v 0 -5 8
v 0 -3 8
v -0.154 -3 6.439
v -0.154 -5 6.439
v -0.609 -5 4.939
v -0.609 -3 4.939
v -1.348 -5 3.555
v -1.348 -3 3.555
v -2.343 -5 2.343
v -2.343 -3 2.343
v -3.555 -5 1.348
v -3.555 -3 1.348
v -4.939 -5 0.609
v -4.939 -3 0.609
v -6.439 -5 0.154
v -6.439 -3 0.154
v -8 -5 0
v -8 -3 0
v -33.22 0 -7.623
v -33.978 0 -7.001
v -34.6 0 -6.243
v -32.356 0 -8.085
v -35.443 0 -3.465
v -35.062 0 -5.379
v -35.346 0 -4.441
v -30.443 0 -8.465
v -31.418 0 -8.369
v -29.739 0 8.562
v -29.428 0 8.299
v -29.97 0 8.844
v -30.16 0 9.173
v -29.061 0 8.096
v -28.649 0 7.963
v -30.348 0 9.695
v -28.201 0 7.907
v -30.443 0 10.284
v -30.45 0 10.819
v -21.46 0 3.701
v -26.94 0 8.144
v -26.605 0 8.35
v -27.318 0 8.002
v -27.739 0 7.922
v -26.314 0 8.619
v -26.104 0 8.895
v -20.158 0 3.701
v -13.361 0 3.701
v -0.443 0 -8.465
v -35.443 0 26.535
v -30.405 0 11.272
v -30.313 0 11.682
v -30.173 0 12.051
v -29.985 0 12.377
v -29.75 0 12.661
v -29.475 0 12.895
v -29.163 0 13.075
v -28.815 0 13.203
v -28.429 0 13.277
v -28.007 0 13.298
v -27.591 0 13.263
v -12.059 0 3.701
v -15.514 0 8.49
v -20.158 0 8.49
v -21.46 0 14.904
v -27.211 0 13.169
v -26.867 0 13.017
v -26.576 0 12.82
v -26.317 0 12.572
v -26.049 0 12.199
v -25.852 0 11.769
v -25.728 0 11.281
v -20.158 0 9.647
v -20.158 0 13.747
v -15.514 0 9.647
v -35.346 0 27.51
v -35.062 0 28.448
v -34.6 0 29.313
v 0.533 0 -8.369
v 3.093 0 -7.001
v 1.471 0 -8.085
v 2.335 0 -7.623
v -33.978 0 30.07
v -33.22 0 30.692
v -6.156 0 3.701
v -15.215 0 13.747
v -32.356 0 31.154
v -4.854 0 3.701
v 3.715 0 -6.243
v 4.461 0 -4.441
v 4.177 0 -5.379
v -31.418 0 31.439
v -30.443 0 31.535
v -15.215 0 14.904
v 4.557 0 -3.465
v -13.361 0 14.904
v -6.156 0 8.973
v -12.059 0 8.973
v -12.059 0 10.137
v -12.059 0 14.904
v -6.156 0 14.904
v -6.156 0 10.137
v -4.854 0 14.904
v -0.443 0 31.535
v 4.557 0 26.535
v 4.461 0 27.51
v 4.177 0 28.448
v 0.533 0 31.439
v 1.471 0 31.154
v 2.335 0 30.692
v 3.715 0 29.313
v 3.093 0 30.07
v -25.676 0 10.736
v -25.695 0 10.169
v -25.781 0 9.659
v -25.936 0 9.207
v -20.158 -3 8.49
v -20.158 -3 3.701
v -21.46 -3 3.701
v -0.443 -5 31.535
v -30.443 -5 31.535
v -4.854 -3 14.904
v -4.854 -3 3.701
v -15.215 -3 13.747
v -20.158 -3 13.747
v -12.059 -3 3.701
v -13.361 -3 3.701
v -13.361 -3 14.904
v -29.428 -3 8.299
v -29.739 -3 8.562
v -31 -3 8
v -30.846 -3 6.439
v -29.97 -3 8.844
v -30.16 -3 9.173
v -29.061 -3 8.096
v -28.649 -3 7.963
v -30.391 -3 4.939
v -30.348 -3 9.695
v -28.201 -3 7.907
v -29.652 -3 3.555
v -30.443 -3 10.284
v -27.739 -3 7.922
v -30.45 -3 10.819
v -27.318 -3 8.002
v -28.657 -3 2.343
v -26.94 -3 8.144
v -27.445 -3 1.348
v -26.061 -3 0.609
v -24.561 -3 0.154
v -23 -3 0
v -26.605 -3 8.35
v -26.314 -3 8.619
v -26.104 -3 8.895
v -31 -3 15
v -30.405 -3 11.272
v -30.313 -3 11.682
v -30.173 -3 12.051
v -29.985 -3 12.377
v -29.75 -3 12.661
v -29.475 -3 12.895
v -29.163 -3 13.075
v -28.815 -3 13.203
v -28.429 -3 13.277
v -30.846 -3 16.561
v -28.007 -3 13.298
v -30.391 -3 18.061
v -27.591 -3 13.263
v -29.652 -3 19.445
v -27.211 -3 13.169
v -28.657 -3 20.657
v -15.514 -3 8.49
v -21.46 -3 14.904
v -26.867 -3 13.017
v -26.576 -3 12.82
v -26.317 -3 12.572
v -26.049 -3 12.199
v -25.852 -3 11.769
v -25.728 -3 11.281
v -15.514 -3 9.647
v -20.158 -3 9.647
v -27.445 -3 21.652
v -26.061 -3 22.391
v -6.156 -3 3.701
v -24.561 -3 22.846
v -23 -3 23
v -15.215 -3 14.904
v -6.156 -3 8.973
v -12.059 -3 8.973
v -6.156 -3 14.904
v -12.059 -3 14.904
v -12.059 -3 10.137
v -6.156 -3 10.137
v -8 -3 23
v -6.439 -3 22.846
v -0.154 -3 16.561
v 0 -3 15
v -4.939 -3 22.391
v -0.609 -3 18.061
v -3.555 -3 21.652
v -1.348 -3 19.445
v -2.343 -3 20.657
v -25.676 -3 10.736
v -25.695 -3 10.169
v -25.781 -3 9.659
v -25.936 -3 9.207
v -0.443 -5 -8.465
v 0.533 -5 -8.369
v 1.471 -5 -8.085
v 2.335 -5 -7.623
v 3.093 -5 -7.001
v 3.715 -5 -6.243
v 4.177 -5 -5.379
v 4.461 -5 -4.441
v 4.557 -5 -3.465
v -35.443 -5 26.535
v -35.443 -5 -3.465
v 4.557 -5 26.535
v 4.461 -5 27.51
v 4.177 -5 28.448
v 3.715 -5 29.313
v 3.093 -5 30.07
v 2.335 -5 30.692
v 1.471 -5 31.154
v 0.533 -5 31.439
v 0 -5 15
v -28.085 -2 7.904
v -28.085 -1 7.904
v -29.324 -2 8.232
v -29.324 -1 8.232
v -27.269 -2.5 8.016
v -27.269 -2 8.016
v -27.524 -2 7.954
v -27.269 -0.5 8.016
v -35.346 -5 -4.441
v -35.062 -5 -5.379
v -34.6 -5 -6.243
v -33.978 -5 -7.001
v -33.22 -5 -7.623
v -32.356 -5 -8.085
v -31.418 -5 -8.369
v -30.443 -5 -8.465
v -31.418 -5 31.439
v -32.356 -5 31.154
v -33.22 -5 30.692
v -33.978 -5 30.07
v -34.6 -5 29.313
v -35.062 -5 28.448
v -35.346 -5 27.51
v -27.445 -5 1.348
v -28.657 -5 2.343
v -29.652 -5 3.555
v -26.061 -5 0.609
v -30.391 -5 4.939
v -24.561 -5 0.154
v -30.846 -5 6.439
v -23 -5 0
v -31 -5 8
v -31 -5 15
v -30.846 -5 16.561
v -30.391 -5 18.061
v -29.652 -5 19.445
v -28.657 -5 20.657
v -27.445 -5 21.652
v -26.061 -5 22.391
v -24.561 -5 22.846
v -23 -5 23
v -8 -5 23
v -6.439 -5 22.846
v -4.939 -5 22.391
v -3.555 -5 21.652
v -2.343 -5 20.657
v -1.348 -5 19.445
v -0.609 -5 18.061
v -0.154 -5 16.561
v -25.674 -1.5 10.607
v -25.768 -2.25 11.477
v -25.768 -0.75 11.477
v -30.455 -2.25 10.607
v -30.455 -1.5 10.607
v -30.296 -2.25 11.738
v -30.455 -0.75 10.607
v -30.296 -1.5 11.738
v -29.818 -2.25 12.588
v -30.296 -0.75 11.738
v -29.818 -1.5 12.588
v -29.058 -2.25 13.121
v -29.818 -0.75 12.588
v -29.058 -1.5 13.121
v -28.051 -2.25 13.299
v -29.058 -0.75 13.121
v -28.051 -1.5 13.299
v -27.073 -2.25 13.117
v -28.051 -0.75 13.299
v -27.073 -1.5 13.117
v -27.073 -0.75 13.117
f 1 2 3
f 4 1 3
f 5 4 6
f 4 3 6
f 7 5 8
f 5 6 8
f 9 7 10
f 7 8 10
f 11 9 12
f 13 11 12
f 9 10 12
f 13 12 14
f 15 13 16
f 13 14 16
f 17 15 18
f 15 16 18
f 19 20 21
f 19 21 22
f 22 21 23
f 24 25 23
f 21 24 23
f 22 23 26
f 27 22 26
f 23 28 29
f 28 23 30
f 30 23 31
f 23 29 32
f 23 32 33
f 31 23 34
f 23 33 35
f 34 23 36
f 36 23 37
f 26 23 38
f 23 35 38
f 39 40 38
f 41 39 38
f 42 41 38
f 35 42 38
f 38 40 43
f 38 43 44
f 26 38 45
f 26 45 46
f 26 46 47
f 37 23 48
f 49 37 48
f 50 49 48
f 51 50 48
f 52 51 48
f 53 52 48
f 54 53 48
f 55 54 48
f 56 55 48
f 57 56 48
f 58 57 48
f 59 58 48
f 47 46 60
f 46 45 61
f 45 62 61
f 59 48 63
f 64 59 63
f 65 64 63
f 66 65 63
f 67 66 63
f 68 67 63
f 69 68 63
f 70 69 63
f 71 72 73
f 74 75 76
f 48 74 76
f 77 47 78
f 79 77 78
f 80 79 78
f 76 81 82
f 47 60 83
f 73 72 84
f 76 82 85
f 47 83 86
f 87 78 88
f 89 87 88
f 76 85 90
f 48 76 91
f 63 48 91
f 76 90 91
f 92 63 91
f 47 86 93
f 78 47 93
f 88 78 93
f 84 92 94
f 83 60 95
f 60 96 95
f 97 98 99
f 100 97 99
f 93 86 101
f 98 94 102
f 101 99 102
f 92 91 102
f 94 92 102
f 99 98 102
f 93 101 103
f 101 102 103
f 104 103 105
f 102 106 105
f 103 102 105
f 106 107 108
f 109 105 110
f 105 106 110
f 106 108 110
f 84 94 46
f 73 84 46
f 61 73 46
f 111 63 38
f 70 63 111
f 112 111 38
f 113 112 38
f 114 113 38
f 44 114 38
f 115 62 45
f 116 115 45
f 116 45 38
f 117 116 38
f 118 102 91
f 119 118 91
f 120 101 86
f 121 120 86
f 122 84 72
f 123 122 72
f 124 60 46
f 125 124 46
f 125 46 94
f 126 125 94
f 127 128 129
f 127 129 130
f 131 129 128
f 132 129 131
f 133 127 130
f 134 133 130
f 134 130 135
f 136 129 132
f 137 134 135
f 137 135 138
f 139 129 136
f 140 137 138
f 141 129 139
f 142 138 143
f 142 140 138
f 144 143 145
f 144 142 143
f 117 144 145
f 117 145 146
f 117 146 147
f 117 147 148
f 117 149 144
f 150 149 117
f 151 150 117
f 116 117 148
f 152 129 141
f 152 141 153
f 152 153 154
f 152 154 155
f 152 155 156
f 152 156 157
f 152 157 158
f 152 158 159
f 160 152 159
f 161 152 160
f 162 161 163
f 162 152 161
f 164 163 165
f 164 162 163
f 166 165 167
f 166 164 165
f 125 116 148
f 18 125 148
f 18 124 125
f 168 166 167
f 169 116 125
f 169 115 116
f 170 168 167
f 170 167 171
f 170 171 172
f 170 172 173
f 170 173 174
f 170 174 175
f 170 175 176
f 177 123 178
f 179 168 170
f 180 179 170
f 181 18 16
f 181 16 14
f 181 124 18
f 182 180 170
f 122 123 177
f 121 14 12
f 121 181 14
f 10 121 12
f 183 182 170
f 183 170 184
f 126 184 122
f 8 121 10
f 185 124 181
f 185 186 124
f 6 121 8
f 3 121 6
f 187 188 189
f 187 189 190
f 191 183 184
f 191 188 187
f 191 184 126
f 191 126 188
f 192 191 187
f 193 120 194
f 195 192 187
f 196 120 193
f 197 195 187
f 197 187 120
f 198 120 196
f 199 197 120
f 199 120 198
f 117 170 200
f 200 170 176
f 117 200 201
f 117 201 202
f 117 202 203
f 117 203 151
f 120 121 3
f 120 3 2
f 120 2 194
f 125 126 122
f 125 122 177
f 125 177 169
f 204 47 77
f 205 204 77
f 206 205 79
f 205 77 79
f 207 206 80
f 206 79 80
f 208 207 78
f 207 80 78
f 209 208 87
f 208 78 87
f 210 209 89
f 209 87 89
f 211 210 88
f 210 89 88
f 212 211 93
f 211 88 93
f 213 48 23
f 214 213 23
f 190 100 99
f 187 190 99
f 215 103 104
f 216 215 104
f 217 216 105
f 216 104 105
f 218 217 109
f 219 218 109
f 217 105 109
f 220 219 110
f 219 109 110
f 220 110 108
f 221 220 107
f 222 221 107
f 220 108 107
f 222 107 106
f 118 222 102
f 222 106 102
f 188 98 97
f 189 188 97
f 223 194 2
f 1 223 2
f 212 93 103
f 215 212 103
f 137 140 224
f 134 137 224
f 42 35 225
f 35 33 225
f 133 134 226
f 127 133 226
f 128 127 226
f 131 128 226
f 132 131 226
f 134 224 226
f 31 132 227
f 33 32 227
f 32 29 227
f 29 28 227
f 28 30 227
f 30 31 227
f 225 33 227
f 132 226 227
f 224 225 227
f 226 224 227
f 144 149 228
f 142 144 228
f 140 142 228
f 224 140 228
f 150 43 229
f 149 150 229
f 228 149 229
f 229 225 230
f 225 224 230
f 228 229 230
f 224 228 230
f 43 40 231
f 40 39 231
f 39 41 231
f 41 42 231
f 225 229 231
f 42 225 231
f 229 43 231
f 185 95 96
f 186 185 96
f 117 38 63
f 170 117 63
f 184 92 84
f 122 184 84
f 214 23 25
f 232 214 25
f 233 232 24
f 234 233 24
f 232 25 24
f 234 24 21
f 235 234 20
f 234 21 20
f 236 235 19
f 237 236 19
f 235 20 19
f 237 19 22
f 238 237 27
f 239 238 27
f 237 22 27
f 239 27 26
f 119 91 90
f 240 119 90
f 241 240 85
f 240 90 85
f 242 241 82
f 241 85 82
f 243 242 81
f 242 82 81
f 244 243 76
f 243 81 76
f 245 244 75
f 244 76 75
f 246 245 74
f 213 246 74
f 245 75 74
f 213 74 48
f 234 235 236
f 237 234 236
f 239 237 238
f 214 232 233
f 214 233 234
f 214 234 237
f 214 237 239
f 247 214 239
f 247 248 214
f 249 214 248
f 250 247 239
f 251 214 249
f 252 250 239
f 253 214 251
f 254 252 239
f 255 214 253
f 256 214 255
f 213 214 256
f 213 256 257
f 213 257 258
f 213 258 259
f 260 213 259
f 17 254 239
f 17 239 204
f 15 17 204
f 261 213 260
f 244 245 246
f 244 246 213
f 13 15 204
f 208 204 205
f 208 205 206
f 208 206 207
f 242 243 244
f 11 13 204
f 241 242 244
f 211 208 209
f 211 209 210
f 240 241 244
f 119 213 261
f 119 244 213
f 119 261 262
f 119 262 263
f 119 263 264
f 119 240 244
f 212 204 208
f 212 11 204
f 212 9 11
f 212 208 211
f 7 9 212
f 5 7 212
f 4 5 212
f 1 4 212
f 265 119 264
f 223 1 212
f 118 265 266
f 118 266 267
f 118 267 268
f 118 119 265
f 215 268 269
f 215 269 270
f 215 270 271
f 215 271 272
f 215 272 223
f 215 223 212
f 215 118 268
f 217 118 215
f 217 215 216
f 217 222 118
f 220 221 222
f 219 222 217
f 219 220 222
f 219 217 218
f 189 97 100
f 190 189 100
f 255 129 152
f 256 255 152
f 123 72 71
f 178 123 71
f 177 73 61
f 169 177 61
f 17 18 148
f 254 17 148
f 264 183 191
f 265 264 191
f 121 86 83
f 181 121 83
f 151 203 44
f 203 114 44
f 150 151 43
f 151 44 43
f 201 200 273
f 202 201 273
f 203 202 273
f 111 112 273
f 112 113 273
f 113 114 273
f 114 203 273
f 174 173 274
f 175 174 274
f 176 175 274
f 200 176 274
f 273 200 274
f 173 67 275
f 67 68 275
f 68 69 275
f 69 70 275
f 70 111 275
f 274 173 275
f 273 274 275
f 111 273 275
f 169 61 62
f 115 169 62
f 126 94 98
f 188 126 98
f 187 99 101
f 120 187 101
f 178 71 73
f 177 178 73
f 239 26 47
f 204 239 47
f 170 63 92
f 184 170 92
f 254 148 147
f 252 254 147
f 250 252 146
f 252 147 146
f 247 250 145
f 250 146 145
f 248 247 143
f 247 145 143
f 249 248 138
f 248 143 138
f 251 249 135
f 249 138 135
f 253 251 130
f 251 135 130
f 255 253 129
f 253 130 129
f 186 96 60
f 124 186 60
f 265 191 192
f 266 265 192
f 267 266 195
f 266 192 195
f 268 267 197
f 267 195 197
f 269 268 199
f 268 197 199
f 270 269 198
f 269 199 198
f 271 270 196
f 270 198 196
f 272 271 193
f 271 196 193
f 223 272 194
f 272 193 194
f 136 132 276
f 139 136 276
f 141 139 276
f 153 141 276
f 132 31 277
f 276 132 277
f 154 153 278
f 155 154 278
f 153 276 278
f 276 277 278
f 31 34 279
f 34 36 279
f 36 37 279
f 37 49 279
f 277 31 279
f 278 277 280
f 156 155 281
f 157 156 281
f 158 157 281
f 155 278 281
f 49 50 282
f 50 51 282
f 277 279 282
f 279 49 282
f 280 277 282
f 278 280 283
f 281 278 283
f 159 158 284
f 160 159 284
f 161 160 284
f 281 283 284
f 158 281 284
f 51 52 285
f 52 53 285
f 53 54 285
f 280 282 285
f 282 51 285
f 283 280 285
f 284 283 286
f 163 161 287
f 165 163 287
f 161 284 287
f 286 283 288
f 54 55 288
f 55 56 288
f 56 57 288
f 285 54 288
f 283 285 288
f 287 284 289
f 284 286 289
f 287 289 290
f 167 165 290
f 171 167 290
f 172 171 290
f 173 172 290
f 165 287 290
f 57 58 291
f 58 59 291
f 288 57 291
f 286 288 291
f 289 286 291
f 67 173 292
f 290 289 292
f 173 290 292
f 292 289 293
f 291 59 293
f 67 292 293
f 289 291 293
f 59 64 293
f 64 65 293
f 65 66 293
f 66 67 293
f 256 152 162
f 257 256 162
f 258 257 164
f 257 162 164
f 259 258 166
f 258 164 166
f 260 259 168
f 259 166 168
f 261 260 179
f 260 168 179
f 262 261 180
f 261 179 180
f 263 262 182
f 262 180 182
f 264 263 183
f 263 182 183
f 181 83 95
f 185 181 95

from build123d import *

# Parameters (mm, degrees)
F1_DEPTH = 3
F2_DEPTH = 5


with BuildPart() as f1:
    # F0 (on Front) → F1 (new body)
    with BuildSketch(Plane.XZ):
        with BuildLine():
            Line((-23, 0), (-8, 0))
            ThreePointArc((-8, 0), (-2.3431457505, 2.3431457505), (0, 8))
            Line((0, 8), (0, 15))
            ThreePointArc((0, 15), (-2.3431457505, 20.6568542495), (-8, 23))
            Line((-8, 23), (-23, 23))
            ThreePointArc((-23, 23), (-28.6568542495, 20.6568542495), (-31, 15))
            Line((-31, 15), (-31, 8))
            ThreePointArc((-31, 8), (-28.6568542495, 2.3431457505), (-23, 0))
        make_face()
        with BuildLine():
            add(Edge.make_bspline(
                [(-26.3173828125, 12.5717230903), (-25.6740451389, 11.8448350694), (-25.6740451389, 10.6067708333)],
                knots=[0, 0, 0, 1, 1, 1], degree=2))
            add(Edge.make_bspline(
                [(-25.6740451389, 10.6067708333), (-25.6740451389, 9.3337673611), (-26.3143446181, 8.6190321181)],
                knots=[0, 0, 0, 1, 1, 1], degree=2))
            add(Edge.make_bspline(
                [(-26.3143446181, 8.6190321181), (-26.9546440972, 7.904296875), (-28.0848524306, 7.904296875)],
                knots=[0, 0, 0, 1, 1, 1], degree=2))
            add(Edge.make_bspline(
                [(-28.0848524306, 7.904296875), (-28.7836371528, 7.904296875), (-29.3244357639, 8.232421875)],
                knots=[0, 0, 0, 1, 1, 1], degree=2))
            add(Edge.make_bspline(
                [(-29.3244357639, 8.232421875), (-29.865234375, 8.560546875), (-30.1599392361, 9.1727430556)],
                knots=[0, 0, 0, 1, 1, 1], degree=2))
            add(Edge.make_bspline(
                [(-30.1599392361, 9.1727430556), (-30.4546440972, 9.7849392361), (-30.4546440972, 10.6067708333)],
                knots=[0, 0, 0, 1, 1, 1], degree=2))
            add(Edge.make_bspline(
                [(-30.4546440972, 10.6067708333), (-30.4546440972, 11.8782552083), (-29.8181423611, 12.5884331597)],
                knots=[0, 0, 0, 1, 1, 1], degree=2))
            add(Edge.make_bspline(
                [(-29.8181423611, 12.5884331597), (-29.181640625, 13.2986111111), (-28.0514322917, 13.2986111111)],
                knots=[0, 0, 0, 1, 1, 1], degree=2))
            add(Edge.make_bspline(
                [(-28.0514322917, 13.2986111111), (-26.9607204861, 13.2986111111), (-26.3173828125, 12.5717230903)],
                knots=[0, 0, 0, 1, 1, 1], degree=2))
        make_face(mode=Mode.SUBTRACT)
        Polygon((-20.1579996961, 8.4896369224), (-20.1579996961, 3.7006579805), (-21.4600723116, 3.7006579805), (-21.4600723116, 14.904367548), (-15.2145375625, 14.904367548), (-15.2145375625, 13.7469696675), (-20.1579996961, 13.7469696675), (-20.1579996961, 9.6470348028), (-15.5136954893, 9.6470348028), (-15.5136954893, 8.4896369224), align=None, mode=Mode.SUBTRACT)
        Polygon((-4.8543552639, 14.904367548), (-4.8543552639, 3.7006579805), (-6.1564278794, 3.7006579805), (-6.1564278794, 8.9727034106), (-12.0586666469, 8.9727034106), (-12.0586666469, 3.7006579805), (-13.3607392625, 3.7006579805), (-13.3607392625, 14.904367548), (-12.0586666469, 14.904367548), (-12.0586666469, 10.1374576335), (-6.1564278794, 10.1374576335), (-6.1564278794, 14.904367548), align=None, mode=Mode.SUBTRACT)
    extrude(amount=F1_DEPTH)

    # F0 (on Front) → F2 (join)
    with BuildSketch(Plane.XZ):
        with BuildLine():
            Line((-0.4425173427, 31.5346689522), (-30.4425173427, 31.5346689522))
            ThreePointArc((-30.4425173427, 31.5346689522), (-33.9780512487, 30.0702028582), (-35.4425173427, 26.5346689522))
            Line((-35.4425173427, 26.5346689522), (-35.4425173427, -3.4653310478))
            ThreePointArc((-35.4425173427, -3.4653310478), (-33.9780512487, -7.0008649537), (-30.4425173427, -8.4653310478))
            Line((-30.4425173427, -8.4653310478), (-0.4425173427, -8.4653310478))
            ThreePointArc((-0.4425173427, -8.4653310478), (3.0930165632, -7.0008649537), (4.5574826573, -3.4653310478))
            Line((4.5574826573, -3.4653310478), (4.5574826573, 26.5346689522))
            ThreePointArc((4.5574826573, 26.5346689522), (3.0930165632, 30.0702028582), (-0.4425173427, 31.5346689522))
        make_face()
        with BuildLine():
            ThreePointArc((0, 8), (-2.3431457505, 2.3431457505), (-8, 0))
            Line((-8, 0), (-23, 0))
            ThreePointArc((-23, 0), (-28.6568542495, 2.3431457505), (-31, 8))
            Line((-31, 8), (-31, 15))
            ThreePointArc((-31, 15), (-28.6568542495, 20.6568542495), (-23, 23))
            Line((-23, 23), (-8, 23))
            ThreePointArc((-8, 23), (-2.3431457505, 20.6568542495), (0, 15))
            Line((0, 15), (0, 8))
        make_face(mode=Mode.SUBTRACT)
    extrude(amount=F2_DEPTH)


solid = f1.part
